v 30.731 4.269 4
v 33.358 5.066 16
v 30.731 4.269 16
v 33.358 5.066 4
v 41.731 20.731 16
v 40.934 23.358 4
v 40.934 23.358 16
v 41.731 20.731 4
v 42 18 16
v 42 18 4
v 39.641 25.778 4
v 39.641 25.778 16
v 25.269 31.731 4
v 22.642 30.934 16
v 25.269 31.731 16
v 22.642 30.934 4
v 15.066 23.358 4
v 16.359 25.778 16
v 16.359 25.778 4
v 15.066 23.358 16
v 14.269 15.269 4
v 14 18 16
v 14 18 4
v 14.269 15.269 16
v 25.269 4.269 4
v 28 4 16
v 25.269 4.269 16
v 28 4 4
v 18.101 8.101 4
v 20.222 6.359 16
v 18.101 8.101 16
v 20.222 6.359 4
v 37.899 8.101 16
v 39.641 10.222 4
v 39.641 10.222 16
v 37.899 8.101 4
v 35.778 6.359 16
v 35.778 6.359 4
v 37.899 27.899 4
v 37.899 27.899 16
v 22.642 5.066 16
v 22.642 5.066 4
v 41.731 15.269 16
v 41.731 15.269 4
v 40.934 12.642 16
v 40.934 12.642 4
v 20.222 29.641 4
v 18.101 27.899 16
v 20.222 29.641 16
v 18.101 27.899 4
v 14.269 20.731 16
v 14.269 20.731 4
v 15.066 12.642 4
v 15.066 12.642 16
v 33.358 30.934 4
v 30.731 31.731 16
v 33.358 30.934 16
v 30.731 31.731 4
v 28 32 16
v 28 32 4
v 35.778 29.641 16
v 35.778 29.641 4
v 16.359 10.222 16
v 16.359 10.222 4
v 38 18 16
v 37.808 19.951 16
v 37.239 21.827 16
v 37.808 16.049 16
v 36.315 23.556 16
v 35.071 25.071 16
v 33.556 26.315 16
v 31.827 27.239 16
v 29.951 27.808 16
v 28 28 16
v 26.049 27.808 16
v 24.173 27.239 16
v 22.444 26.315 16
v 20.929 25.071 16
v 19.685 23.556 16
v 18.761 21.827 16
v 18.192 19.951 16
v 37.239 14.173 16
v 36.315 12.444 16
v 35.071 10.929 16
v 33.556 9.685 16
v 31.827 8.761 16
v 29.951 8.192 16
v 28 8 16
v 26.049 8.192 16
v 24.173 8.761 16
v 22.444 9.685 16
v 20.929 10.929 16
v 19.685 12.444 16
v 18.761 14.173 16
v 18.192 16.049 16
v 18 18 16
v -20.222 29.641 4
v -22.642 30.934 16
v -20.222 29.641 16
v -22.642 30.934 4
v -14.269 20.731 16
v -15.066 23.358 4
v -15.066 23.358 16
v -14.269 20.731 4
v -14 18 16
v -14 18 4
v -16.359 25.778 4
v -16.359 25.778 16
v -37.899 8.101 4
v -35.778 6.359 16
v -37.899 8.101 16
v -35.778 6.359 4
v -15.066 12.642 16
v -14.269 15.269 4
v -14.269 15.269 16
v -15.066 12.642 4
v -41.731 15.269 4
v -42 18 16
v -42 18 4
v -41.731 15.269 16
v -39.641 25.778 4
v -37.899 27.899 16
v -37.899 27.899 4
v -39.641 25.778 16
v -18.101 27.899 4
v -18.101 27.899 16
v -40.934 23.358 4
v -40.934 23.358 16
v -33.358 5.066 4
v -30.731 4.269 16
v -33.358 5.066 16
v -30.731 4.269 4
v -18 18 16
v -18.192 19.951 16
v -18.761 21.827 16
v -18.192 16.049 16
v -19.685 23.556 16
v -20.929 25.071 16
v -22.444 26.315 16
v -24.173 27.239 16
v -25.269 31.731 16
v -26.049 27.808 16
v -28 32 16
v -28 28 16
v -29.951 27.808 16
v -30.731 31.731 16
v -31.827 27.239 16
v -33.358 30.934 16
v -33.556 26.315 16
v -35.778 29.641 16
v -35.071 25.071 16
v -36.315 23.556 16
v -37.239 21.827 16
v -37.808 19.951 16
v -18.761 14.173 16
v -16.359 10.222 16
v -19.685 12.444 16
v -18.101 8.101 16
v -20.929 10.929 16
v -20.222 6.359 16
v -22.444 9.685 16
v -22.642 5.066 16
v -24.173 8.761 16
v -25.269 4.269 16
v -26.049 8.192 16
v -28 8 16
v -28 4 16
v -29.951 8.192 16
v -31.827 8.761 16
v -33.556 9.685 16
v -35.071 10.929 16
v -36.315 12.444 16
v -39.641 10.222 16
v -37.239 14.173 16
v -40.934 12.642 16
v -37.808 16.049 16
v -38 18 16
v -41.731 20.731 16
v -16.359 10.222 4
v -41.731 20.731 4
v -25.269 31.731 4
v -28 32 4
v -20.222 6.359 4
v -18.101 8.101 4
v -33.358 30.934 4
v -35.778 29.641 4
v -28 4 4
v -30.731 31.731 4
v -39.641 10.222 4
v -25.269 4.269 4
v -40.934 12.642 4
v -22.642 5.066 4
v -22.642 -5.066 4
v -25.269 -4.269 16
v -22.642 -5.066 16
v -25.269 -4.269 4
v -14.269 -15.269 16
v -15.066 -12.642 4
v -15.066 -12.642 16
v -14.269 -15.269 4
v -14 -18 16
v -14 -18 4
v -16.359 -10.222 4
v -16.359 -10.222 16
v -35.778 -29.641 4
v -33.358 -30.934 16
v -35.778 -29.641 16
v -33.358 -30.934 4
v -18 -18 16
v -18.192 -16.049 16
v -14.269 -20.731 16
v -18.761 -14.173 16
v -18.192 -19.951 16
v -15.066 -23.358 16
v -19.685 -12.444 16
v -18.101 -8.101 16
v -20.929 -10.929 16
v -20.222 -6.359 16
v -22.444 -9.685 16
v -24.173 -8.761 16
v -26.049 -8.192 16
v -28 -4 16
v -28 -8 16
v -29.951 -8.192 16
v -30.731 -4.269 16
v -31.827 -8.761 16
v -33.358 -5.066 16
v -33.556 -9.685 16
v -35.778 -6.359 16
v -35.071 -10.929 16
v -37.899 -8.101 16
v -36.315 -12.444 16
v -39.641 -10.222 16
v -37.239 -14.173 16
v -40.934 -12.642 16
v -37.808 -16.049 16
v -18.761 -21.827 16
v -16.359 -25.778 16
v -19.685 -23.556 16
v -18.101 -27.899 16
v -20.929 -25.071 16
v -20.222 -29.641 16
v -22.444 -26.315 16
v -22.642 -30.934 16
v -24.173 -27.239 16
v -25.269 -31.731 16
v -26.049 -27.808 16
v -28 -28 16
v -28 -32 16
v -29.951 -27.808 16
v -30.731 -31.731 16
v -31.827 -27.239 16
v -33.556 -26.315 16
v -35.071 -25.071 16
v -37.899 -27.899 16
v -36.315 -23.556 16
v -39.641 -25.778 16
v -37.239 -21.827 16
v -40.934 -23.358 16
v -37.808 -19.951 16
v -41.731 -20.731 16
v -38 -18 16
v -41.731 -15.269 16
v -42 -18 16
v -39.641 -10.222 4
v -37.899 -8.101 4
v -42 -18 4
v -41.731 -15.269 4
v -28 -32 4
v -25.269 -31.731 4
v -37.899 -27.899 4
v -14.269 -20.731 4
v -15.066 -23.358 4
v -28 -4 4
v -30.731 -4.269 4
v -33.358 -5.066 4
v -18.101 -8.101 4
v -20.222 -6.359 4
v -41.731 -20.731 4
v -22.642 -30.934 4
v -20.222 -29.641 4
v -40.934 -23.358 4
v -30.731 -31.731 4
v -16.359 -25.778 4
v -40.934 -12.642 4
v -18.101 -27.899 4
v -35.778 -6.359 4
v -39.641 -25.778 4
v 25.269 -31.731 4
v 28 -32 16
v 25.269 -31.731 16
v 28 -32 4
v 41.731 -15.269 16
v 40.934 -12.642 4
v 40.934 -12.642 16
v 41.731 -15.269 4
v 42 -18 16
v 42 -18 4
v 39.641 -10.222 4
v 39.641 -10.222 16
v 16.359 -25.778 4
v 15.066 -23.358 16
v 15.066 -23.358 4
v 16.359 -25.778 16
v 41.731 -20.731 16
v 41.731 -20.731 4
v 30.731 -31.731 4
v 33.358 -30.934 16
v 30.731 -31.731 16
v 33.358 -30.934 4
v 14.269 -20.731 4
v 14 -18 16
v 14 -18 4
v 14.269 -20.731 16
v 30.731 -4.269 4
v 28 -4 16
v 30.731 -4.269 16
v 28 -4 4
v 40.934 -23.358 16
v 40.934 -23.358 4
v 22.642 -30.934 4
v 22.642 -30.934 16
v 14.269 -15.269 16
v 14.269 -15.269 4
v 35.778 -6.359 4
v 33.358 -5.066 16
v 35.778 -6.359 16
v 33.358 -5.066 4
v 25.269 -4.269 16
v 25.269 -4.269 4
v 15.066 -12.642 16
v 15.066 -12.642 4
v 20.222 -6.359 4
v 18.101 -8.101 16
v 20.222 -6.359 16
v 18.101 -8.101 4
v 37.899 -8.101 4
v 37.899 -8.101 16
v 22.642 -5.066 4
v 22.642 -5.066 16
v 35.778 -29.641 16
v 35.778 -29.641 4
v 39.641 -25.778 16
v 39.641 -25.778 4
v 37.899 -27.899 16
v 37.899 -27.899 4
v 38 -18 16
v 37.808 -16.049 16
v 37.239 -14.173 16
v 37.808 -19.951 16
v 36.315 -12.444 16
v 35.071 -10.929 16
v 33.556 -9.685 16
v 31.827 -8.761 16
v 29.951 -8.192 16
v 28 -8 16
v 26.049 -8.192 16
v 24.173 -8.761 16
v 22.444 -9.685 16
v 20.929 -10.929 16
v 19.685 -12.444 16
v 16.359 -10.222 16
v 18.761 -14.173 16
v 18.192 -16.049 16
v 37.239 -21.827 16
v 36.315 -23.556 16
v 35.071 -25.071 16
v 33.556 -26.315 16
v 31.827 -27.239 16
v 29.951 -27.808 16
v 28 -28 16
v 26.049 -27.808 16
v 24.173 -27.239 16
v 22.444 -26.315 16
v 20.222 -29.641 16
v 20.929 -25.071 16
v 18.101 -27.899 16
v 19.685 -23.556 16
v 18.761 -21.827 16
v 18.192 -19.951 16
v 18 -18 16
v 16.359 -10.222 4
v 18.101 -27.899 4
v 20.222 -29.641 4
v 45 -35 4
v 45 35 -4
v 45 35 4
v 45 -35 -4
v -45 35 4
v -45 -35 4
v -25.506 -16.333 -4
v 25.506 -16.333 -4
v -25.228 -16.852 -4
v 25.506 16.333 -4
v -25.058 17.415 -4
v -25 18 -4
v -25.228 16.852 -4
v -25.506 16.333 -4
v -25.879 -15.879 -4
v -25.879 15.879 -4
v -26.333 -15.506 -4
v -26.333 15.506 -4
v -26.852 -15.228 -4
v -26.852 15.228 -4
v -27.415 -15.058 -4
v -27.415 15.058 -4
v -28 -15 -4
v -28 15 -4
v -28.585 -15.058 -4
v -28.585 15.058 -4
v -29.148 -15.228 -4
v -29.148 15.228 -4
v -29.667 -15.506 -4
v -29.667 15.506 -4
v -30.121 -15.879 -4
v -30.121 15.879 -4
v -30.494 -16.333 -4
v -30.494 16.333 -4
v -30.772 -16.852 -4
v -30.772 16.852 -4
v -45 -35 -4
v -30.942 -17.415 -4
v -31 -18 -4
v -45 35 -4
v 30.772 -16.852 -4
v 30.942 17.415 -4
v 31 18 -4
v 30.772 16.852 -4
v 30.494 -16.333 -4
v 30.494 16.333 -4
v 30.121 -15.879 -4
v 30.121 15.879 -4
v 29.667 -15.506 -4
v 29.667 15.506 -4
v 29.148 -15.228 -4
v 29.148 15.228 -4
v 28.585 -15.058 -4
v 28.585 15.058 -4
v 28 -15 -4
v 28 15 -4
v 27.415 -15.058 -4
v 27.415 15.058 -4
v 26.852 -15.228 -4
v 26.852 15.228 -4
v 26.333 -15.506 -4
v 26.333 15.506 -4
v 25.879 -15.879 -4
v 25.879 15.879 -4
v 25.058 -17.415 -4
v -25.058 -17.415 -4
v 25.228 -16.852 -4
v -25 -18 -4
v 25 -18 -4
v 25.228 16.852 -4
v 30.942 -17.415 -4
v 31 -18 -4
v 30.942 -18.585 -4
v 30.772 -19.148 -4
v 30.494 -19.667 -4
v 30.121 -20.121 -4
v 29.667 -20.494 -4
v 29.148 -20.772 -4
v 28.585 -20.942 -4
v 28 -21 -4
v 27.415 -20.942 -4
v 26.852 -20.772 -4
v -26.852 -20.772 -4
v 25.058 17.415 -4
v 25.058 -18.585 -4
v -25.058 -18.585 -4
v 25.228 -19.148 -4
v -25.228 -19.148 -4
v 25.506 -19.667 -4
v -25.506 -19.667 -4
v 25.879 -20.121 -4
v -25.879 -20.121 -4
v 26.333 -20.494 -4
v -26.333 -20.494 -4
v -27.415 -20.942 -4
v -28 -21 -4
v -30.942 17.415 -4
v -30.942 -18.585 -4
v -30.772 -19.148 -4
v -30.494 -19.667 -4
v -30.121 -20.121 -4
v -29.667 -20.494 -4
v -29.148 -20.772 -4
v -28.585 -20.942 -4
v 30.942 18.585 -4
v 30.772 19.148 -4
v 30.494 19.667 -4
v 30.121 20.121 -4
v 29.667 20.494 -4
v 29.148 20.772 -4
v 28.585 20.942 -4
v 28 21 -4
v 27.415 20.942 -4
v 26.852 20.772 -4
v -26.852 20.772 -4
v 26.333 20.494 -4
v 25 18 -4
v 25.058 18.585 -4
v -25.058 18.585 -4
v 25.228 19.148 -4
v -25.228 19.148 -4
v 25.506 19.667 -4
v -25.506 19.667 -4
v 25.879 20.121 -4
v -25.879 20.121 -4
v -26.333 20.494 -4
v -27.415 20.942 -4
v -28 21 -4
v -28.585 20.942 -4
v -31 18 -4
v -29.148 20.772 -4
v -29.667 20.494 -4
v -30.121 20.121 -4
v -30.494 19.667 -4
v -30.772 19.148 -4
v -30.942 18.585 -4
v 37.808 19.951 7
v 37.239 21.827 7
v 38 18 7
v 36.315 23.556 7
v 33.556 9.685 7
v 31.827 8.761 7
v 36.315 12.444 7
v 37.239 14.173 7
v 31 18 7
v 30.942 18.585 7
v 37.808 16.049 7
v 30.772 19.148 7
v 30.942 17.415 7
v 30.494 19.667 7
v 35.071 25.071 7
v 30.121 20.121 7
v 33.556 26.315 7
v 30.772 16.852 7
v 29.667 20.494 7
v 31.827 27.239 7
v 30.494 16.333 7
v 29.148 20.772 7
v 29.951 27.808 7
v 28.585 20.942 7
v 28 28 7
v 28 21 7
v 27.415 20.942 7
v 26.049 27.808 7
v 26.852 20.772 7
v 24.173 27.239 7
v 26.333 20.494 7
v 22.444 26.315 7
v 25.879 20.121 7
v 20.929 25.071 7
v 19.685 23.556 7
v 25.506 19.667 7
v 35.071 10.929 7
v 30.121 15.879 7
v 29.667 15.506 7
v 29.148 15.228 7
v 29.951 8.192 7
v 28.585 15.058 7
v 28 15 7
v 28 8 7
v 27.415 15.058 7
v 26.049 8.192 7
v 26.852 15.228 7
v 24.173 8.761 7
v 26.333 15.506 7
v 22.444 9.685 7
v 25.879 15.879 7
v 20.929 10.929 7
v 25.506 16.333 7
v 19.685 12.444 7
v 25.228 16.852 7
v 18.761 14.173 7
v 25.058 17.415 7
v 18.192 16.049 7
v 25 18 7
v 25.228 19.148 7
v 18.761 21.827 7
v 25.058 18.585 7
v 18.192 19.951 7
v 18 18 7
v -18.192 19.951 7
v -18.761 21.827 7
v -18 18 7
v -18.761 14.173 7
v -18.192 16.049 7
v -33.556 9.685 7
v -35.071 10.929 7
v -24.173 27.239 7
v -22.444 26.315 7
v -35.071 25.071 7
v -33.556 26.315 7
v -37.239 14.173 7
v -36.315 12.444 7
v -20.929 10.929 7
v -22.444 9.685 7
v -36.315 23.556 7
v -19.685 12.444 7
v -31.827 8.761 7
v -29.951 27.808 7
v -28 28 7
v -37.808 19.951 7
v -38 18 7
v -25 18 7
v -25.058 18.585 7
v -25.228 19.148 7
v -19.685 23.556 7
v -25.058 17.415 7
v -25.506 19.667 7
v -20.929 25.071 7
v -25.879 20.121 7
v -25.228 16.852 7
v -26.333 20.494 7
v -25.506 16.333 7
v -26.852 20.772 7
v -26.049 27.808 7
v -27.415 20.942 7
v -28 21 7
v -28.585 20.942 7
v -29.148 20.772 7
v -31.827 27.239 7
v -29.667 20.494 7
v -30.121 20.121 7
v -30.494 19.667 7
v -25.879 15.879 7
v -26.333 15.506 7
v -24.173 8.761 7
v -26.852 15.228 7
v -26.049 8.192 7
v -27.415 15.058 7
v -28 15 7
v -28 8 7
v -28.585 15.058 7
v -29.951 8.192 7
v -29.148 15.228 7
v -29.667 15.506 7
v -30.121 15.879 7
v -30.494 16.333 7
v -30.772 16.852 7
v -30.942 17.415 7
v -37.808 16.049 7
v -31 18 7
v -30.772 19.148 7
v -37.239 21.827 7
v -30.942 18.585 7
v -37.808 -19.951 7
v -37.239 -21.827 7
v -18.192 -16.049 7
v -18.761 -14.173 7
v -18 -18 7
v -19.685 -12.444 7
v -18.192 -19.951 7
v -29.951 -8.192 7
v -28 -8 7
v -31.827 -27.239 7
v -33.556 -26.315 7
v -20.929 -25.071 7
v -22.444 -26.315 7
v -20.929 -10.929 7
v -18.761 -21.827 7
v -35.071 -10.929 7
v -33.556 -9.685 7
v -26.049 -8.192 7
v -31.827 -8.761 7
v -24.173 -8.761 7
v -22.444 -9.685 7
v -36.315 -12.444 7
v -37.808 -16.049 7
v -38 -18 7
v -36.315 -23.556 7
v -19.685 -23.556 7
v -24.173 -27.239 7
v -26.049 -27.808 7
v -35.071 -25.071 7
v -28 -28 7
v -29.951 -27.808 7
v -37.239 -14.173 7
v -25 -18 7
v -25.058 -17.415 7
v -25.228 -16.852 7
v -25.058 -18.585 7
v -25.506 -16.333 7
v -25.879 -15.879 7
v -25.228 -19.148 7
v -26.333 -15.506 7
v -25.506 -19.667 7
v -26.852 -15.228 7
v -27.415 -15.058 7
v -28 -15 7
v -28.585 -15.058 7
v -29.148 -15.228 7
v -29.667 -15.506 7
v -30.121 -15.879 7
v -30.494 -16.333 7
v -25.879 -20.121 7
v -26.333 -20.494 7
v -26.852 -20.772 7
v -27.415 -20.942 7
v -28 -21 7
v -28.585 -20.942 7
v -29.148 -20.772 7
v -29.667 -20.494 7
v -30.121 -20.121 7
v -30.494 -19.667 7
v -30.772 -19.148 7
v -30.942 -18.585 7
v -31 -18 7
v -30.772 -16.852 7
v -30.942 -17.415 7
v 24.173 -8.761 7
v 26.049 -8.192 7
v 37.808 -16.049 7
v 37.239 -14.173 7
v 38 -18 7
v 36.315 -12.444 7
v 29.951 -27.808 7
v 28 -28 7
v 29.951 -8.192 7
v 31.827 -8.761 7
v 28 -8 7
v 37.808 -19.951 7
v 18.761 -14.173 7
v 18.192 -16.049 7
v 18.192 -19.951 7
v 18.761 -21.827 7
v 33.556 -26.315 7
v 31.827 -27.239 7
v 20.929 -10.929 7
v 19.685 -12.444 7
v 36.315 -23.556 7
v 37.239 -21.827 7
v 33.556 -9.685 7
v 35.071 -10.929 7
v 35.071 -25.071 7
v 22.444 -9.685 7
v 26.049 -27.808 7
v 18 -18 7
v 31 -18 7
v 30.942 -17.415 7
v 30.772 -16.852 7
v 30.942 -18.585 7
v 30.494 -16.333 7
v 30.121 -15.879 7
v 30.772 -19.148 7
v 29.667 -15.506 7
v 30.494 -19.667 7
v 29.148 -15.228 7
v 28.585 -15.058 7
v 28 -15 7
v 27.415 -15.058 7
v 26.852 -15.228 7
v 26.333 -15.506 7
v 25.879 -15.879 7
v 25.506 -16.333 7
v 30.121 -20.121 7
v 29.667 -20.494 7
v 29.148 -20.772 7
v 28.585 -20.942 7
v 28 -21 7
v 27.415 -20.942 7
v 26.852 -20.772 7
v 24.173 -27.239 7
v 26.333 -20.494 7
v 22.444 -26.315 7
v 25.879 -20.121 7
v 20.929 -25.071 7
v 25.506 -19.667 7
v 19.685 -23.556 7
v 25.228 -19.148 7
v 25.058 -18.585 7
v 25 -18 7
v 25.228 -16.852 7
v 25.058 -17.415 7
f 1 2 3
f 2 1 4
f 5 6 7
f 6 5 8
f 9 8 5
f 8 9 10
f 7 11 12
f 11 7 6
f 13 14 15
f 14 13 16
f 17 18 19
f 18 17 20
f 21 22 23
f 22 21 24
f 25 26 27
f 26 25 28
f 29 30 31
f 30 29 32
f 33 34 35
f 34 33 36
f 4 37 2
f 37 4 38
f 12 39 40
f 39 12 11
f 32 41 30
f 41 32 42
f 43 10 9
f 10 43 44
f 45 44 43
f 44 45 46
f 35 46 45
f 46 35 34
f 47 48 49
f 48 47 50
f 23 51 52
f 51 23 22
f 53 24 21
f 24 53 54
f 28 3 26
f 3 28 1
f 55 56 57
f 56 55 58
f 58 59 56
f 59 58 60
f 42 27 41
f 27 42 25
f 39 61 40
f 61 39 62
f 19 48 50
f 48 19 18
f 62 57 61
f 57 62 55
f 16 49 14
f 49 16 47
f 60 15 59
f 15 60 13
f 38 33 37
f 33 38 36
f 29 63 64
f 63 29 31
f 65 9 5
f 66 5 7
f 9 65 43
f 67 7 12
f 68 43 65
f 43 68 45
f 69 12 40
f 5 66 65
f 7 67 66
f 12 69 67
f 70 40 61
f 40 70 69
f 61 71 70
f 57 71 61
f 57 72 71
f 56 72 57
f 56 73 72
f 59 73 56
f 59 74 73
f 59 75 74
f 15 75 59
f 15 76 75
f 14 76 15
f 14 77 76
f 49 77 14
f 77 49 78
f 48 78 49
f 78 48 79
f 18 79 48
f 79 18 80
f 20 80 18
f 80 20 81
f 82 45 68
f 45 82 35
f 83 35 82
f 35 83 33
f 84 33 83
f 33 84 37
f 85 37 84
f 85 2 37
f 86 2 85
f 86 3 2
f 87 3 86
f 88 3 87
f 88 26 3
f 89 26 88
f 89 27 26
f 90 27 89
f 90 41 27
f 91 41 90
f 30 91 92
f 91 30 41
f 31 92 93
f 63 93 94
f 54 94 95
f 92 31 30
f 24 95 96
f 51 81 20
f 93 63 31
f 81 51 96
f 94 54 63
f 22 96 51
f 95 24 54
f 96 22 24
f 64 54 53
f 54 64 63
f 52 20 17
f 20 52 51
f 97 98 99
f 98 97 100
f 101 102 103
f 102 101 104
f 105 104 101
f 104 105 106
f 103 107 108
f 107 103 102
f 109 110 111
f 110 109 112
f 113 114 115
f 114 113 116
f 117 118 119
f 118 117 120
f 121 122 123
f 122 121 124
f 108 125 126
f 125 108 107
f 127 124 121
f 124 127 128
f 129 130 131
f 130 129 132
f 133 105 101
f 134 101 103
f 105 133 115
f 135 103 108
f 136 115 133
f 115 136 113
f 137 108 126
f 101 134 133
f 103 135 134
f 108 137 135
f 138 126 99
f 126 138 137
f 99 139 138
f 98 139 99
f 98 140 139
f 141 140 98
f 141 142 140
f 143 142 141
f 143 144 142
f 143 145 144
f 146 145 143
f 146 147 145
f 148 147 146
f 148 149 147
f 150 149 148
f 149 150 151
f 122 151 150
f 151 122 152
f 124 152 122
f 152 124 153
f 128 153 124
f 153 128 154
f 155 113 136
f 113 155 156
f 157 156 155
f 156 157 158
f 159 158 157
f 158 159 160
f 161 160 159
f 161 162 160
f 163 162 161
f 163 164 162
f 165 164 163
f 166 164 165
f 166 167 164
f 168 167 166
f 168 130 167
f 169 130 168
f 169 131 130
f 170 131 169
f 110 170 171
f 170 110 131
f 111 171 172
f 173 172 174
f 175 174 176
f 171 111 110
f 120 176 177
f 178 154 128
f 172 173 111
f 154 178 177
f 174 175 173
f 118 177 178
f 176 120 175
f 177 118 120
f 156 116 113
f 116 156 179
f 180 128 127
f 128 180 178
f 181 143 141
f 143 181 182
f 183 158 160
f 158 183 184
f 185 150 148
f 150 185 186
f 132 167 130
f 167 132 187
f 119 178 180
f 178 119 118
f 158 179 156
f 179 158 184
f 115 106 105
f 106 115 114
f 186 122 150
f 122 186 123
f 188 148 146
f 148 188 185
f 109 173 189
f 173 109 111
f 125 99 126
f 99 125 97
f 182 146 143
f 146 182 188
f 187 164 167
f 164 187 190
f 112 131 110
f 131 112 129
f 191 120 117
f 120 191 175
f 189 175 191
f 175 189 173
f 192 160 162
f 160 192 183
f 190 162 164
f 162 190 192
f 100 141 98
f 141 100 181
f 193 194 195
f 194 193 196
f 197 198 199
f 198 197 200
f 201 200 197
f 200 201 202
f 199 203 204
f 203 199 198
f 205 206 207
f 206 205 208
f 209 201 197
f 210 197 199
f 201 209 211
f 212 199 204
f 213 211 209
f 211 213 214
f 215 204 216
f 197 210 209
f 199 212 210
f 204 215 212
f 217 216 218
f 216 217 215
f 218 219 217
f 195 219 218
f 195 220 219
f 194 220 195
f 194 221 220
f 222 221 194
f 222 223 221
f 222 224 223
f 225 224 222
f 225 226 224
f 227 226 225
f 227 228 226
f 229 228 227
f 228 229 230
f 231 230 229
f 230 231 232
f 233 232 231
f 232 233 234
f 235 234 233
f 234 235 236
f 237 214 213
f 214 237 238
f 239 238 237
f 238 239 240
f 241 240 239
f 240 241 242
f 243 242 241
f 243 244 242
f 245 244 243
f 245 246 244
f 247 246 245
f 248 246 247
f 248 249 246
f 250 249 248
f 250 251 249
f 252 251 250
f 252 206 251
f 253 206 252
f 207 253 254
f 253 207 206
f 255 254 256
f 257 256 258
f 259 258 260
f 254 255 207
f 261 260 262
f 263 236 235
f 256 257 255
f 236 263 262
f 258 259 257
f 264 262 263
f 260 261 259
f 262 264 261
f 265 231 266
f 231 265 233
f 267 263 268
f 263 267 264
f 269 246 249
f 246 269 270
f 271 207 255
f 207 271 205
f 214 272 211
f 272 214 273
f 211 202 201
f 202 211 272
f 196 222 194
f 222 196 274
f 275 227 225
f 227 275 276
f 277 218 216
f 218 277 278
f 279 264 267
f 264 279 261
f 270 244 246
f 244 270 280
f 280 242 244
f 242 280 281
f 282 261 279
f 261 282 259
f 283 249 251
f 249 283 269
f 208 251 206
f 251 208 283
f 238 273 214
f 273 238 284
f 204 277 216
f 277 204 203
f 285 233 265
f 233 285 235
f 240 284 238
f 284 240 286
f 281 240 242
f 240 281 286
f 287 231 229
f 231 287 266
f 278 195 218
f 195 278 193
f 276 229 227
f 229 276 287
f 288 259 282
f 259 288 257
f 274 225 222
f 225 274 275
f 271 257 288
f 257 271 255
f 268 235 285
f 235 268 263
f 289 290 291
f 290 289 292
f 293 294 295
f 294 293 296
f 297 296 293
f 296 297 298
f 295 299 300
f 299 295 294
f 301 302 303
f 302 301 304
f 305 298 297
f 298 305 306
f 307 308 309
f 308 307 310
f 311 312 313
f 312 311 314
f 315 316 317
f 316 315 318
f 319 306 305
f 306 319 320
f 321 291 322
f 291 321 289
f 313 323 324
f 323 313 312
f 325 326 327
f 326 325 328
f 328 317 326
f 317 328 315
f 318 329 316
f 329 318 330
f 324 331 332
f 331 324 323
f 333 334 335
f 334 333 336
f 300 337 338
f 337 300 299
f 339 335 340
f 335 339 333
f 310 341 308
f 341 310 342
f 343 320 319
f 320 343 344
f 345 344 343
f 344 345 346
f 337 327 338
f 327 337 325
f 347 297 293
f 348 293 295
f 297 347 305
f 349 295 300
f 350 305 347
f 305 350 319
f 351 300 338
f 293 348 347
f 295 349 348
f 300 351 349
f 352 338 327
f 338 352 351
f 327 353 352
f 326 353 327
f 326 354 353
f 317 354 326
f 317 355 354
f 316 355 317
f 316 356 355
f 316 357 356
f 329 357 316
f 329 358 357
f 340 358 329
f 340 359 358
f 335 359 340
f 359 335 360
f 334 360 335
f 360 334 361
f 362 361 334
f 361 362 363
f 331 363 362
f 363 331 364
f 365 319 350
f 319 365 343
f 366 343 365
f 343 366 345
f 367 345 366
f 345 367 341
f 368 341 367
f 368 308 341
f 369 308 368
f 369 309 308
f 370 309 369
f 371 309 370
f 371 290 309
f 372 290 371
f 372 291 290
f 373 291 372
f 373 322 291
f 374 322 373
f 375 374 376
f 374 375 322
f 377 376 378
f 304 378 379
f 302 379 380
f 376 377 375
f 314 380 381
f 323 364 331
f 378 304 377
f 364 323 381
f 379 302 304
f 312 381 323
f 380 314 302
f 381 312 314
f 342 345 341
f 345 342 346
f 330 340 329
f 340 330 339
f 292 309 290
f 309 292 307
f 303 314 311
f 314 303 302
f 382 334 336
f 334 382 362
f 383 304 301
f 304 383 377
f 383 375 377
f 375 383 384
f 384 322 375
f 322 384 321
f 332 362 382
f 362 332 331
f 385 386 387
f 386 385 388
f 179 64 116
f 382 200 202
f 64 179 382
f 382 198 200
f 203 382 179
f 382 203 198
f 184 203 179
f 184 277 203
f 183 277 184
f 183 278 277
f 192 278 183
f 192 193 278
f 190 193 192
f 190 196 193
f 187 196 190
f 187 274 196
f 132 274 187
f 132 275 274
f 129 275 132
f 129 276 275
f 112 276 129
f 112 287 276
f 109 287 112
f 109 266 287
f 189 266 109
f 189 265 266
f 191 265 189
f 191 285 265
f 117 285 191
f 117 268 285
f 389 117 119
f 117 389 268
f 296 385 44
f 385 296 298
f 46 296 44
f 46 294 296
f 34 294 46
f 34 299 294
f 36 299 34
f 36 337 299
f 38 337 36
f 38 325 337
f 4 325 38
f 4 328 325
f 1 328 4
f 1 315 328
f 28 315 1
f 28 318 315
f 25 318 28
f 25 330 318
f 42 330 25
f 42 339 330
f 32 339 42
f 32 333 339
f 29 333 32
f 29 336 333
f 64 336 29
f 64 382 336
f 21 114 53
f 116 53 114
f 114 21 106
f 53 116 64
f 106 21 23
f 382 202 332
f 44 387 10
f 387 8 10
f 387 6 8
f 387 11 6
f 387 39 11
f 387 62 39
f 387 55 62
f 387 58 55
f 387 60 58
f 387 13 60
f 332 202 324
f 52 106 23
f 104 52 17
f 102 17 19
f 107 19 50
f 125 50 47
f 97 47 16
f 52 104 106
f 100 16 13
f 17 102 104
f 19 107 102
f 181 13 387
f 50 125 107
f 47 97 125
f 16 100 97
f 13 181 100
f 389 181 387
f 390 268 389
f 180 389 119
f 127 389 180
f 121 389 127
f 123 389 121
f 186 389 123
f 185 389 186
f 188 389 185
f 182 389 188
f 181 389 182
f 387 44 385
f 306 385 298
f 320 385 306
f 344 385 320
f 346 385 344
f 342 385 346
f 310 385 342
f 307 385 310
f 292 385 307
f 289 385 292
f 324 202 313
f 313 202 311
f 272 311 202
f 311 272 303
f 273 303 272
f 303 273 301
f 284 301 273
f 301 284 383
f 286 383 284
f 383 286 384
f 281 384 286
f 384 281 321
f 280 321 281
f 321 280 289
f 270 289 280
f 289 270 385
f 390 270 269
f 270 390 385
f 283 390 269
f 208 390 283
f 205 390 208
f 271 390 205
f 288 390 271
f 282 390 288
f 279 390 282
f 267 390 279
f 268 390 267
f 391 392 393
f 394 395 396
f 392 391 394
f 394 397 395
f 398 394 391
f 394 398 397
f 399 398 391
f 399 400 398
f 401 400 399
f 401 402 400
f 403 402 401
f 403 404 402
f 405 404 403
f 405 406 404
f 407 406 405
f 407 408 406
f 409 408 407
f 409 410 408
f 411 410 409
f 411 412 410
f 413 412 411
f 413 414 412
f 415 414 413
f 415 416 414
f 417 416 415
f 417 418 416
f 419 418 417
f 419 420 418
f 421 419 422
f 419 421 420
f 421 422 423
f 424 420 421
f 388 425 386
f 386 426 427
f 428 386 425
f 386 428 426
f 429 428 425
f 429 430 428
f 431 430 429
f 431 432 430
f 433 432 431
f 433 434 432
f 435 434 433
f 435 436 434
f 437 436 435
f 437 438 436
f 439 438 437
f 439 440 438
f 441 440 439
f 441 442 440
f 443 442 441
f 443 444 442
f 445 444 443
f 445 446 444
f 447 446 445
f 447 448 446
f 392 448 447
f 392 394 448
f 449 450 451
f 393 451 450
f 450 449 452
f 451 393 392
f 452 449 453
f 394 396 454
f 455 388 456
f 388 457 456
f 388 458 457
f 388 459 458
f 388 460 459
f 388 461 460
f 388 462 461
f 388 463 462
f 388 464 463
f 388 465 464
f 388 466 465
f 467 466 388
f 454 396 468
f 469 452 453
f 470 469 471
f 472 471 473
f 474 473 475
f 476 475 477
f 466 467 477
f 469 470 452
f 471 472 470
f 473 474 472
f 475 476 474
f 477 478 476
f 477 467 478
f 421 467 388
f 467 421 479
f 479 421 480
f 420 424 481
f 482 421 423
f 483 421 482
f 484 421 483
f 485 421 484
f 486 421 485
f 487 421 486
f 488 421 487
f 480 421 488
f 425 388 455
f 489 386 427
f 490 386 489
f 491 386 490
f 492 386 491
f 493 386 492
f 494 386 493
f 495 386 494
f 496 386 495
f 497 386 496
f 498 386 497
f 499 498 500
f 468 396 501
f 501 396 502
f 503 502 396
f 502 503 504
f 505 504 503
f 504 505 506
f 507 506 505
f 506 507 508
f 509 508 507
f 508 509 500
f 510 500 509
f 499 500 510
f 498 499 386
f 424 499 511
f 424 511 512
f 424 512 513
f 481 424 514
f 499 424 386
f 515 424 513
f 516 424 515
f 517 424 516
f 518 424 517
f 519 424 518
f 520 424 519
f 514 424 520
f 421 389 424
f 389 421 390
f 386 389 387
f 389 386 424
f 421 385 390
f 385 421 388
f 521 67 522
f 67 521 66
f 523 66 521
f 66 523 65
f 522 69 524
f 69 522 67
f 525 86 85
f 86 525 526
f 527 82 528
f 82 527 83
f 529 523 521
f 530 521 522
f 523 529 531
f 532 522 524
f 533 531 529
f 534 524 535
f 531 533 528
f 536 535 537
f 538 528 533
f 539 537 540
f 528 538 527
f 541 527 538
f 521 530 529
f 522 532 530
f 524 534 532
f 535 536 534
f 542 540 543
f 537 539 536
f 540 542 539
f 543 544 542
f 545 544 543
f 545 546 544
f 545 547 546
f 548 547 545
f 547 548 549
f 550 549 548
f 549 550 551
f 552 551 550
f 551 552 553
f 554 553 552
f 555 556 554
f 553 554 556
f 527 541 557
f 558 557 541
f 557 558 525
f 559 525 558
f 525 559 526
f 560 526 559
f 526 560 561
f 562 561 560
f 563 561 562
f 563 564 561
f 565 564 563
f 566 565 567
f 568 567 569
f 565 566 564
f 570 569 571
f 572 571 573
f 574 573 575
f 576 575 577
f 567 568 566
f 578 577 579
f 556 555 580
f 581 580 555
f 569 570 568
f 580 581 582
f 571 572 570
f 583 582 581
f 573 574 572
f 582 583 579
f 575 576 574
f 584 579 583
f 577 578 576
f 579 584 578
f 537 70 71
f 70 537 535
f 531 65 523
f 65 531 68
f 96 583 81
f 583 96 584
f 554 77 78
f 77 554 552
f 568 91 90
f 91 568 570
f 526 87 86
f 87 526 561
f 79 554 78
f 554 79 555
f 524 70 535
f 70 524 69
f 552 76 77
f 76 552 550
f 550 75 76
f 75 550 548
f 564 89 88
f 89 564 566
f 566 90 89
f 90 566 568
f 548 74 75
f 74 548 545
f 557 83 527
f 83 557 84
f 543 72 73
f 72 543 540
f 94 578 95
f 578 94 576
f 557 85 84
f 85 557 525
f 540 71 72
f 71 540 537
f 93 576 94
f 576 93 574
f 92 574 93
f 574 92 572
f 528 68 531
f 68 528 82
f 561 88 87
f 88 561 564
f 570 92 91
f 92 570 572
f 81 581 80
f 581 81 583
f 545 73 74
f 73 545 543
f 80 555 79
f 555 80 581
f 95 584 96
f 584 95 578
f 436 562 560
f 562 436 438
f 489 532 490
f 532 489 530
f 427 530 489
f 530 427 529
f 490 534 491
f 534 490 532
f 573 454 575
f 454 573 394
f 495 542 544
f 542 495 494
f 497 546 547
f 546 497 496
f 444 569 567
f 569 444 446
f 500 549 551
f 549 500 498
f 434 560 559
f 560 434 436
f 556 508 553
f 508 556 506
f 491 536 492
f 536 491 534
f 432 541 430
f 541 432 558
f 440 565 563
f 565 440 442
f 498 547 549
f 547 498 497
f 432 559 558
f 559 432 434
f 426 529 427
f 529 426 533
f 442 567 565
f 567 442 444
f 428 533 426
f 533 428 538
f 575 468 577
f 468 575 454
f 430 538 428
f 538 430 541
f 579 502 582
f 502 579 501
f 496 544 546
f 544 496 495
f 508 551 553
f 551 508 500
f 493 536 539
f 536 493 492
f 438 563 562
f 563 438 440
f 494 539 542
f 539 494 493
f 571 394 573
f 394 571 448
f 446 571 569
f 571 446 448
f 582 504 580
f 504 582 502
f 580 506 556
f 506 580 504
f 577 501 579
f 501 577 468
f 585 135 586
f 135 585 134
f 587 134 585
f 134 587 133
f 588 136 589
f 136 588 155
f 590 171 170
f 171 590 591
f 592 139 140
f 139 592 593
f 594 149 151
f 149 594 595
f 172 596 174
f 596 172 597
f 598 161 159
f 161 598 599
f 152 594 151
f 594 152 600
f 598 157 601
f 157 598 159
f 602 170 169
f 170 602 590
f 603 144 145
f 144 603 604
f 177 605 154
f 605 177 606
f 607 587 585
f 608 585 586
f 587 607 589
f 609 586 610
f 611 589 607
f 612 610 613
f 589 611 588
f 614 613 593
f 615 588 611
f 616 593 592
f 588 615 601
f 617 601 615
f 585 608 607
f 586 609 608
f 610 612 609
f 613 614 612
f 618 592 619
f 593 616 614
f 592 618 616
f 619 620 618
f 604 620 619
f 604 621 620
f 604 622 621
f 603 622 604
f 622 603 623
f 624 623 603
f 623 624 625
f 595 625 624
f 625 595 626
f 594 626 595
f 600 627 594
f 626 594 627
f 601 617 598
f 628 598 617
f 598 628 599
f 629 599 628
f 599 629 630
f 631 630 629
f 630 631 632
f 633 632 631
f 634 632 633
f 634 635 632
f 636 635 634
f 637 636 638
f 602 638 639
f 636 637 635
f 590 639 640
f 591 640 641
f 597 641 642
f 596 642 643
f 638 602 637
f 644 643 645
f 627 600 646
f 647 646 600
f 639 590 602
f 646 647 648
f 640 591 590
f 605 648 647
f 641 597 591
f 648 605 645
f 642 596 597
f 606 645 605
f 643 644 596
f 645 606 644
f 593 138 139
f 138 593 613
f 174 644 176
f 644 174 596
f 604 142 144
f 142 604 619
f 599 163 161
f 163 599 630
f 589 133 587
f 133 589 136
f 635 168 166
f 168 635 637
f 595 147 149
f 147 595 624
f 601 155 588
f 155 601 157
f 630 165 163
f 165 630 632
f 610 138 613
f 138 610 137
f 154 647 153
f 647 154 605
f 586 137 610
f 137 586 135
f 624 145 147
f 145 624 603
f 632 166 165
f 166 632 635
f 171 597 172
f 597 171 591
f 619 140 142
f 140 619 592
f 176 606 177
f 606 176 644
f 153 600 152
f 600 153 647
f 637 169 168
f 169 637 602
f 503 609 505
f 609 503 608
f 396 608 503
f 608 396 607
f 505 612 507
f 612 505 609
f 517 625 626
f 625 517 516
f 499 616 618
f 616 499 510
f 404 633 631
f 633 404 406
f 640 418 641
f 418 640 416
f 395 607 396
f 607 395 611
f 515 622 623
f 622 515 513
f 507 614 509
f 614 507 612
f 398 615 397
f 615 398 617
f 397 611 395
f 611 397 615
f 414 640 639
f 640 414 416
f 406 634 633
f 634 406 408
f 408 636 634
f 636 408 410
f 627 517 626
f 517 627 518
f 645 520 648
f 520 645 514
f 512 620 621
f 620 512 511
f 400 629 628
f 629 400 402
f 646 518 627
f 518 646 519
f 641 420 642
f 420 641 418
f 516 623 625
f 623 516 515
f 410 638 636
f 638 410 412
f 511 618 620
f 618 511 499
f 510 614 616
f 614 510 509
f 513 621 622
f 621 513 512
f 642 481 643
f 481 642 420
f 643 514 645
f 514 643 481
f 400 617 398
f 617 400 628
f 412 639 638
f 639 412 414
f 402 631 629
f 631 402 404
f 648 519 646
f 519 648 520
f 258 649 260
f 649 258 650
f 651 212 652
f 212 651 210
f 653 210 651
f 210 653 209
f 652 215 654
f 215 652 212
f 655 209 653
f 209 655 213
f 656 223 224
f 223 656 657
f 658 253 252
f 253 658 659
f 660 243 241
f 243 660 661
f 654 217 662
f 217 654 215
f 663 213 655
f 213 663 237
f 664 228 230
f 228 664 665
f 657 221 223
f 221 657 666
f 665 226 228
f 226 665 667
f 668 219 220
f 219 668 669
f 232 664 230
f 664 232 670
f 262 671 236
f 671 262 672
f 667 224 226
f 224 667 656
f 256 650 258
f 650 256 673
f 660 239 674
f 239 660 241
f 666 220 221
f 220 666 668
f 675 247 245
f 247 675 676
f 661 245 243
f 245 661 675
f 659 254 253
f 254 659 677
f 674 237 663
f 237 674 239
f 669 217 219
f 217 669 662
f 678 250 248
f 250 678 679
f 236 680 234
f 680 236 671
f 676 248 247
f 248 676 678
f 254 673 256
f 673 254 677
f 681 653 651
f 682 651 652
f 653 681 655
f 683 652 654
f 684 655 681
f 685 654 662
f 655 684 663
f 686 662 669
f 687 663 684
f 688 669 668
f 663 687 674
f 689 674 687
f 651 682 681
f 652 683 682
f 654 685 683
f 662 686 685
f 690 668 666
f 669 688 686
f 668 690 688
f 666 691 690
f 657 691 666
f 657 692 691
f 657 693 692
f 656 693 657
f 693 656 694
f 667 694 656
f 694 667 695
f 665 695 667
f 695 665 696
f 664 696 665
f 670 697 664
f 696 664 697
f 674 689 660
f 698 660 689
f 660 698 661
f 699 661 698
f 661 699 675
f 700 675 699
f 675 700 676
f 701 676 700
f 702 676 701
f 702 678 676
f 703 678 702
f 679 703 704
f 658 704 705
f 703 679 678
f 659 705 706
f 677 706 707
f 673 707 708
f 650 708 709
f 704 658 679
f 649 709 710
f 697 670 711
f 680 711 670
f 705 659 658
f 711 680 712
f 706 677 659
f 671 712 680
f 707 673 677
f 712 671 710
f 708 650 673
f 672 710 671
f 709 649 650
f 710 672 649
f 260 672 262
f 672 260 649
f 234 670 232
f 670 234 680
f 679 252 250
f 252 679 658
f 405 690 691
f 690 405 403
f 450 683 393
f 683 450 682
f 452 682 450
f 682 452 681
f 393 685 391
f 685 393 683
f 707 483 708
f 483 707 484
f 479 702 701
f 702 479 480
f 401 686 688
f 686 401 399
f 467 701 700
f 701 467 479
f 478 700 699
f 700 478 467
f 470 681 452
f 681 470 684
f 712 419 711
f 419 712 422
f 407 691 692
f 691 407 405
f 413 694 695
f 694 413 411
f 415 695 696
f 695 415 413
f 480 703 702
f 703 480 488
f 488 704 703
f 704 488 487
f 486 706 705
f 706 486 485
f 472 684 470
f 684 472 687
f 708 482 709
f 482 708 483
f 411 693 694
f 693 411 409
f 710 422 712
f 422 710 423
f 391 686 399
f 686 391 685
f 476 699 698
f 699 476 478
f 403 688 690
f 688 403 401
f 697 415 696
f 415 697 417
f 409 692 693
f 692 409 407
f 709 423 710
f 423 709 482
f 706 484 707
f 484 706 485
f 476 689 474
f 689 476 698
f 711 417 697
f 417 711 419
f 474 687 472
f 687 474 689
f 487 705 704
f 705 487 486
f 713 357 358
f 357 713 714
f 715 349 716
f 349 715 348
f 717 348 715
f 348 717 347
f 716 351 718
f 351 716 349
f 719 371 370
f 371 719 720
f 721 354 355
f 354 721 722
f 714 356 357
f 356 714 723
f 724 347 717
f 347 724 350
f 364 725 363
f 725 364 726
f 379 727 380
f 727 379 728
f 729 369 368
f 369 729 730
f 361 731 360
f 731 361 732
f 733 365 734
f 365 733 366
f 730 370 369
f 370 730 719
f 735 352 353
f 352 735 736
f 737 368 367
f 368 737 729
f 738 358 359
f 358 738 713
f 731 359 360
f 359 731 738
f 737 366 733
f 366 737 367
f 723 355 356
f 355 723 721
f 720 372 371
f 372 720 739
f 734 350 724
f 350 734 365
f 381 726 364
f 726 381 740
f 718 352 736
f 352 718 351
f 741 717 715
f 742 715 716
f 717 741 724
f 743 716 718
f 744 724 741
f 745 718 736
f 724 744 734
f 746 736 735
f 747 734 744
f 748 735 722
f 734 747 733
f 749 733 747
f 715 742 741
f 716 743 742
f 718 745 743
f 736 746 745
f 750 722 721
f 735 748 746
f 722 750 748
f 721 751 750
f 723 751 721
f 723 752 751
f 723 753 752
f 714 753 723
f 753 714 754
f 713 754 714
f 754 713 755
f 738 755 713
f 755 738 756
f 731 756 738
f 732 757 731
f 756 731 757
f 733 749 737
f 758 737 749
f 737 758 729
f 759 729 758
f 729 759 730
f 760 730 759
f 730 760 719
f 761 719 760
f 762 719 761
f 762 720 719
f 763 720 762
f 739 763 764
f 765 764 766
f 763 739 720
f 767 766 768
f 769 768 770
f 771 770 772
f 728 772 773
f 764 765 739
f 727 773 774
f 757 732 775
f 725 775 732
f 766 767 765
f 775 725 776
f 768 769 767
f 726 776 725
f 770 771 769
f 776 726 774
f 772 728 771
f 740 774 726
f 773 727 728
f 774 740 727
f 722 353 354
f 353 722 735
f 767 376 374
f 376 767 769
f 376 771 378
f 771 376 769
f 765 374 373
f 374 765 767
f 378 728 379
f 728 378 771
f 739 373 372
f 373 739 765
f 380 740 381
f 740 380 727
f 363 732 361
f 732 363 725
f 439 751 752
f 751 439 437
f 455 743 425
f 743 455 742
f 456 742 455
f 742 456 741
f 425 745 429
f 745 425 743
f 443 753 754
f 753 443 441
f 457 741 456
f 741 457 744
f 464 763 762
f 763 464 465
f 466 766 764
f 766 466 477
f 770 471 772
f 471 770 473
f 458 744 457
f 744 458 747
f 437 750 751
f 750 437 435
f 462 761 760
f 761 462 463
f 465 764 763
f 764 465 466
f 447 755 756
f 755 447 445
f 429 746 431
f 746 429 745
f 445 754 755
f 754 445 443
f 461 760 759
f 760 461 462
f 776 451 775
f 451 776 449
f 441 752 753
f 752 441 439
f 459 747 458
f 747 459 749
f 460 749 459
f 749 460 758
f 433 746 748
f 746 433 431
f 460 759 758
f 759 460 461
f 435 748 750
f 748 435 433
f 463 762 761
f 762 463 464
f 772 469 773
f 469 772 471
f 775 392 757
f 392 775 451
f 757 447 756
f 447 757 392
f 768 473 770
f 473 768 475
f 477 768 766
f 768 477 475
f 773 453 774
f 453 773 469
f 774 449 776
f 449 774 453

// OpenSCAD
$fn = 32;

// ----------------------------------------------------------------------
// Socket pad plate
// bosses with counterbored sockets for the screws
// ----------------------------------------------------------------------

// --- parameters (mm) ---
base_t = 8;           // base plate thickness
boss_h = 12;          // boss height above the base plate
boss_d = 28;          // boss diameter
socket_d = 20;        // socket diameter
socket_depth = 9;     // socket depth from the boss face
bolt_d = 6;           // screw clearance hole through the socket floor
plate = [90, 70, 8];  // overall size (x, y, z)
edge = 17;            // boss centre offset from the plate edge
pads = 4;             // boss count, one per corner

// --- derived feature positions (mm) ---
height = base_t + boss_h;        // = 20   overall height of the part
corner_x = plate[0] / 2 - edge;  // = 28   boss centre X
corner_y = plate[1] / 2 - edge;  // = 18   boss centre Y
feature_centers = [
  [corner_x, corner_y],
  [-corner_x, corner_y],
  [-corner_x, -corner_y],
  [corner_x, -corner_y]
];   // boss centres: sockets, holes and the pads themselves are placed from here

// base plate, bosses on feature_centers, socket + through hole in each
difference() {
  union() {
    cube(plate, center = true);
    for (centre = feature_centers)
      translate([centre[0], centre[1], plate[2] / 2 - 1])
        cylinder(d = boss_d, h = boss_h + 1);
  }
  for (centre = feature_centers) {
    translate([centre[0], centre[1], plate[2] / 2 + boss_h - socket_depth])
      cylinder(d = socket_d, h = socket_depth + 1);
    translate([centre[0], centre[1], -height])
      cylinder(d = bolt_d, h = 2 * height + 2);  // through the socket floor
  }
}
